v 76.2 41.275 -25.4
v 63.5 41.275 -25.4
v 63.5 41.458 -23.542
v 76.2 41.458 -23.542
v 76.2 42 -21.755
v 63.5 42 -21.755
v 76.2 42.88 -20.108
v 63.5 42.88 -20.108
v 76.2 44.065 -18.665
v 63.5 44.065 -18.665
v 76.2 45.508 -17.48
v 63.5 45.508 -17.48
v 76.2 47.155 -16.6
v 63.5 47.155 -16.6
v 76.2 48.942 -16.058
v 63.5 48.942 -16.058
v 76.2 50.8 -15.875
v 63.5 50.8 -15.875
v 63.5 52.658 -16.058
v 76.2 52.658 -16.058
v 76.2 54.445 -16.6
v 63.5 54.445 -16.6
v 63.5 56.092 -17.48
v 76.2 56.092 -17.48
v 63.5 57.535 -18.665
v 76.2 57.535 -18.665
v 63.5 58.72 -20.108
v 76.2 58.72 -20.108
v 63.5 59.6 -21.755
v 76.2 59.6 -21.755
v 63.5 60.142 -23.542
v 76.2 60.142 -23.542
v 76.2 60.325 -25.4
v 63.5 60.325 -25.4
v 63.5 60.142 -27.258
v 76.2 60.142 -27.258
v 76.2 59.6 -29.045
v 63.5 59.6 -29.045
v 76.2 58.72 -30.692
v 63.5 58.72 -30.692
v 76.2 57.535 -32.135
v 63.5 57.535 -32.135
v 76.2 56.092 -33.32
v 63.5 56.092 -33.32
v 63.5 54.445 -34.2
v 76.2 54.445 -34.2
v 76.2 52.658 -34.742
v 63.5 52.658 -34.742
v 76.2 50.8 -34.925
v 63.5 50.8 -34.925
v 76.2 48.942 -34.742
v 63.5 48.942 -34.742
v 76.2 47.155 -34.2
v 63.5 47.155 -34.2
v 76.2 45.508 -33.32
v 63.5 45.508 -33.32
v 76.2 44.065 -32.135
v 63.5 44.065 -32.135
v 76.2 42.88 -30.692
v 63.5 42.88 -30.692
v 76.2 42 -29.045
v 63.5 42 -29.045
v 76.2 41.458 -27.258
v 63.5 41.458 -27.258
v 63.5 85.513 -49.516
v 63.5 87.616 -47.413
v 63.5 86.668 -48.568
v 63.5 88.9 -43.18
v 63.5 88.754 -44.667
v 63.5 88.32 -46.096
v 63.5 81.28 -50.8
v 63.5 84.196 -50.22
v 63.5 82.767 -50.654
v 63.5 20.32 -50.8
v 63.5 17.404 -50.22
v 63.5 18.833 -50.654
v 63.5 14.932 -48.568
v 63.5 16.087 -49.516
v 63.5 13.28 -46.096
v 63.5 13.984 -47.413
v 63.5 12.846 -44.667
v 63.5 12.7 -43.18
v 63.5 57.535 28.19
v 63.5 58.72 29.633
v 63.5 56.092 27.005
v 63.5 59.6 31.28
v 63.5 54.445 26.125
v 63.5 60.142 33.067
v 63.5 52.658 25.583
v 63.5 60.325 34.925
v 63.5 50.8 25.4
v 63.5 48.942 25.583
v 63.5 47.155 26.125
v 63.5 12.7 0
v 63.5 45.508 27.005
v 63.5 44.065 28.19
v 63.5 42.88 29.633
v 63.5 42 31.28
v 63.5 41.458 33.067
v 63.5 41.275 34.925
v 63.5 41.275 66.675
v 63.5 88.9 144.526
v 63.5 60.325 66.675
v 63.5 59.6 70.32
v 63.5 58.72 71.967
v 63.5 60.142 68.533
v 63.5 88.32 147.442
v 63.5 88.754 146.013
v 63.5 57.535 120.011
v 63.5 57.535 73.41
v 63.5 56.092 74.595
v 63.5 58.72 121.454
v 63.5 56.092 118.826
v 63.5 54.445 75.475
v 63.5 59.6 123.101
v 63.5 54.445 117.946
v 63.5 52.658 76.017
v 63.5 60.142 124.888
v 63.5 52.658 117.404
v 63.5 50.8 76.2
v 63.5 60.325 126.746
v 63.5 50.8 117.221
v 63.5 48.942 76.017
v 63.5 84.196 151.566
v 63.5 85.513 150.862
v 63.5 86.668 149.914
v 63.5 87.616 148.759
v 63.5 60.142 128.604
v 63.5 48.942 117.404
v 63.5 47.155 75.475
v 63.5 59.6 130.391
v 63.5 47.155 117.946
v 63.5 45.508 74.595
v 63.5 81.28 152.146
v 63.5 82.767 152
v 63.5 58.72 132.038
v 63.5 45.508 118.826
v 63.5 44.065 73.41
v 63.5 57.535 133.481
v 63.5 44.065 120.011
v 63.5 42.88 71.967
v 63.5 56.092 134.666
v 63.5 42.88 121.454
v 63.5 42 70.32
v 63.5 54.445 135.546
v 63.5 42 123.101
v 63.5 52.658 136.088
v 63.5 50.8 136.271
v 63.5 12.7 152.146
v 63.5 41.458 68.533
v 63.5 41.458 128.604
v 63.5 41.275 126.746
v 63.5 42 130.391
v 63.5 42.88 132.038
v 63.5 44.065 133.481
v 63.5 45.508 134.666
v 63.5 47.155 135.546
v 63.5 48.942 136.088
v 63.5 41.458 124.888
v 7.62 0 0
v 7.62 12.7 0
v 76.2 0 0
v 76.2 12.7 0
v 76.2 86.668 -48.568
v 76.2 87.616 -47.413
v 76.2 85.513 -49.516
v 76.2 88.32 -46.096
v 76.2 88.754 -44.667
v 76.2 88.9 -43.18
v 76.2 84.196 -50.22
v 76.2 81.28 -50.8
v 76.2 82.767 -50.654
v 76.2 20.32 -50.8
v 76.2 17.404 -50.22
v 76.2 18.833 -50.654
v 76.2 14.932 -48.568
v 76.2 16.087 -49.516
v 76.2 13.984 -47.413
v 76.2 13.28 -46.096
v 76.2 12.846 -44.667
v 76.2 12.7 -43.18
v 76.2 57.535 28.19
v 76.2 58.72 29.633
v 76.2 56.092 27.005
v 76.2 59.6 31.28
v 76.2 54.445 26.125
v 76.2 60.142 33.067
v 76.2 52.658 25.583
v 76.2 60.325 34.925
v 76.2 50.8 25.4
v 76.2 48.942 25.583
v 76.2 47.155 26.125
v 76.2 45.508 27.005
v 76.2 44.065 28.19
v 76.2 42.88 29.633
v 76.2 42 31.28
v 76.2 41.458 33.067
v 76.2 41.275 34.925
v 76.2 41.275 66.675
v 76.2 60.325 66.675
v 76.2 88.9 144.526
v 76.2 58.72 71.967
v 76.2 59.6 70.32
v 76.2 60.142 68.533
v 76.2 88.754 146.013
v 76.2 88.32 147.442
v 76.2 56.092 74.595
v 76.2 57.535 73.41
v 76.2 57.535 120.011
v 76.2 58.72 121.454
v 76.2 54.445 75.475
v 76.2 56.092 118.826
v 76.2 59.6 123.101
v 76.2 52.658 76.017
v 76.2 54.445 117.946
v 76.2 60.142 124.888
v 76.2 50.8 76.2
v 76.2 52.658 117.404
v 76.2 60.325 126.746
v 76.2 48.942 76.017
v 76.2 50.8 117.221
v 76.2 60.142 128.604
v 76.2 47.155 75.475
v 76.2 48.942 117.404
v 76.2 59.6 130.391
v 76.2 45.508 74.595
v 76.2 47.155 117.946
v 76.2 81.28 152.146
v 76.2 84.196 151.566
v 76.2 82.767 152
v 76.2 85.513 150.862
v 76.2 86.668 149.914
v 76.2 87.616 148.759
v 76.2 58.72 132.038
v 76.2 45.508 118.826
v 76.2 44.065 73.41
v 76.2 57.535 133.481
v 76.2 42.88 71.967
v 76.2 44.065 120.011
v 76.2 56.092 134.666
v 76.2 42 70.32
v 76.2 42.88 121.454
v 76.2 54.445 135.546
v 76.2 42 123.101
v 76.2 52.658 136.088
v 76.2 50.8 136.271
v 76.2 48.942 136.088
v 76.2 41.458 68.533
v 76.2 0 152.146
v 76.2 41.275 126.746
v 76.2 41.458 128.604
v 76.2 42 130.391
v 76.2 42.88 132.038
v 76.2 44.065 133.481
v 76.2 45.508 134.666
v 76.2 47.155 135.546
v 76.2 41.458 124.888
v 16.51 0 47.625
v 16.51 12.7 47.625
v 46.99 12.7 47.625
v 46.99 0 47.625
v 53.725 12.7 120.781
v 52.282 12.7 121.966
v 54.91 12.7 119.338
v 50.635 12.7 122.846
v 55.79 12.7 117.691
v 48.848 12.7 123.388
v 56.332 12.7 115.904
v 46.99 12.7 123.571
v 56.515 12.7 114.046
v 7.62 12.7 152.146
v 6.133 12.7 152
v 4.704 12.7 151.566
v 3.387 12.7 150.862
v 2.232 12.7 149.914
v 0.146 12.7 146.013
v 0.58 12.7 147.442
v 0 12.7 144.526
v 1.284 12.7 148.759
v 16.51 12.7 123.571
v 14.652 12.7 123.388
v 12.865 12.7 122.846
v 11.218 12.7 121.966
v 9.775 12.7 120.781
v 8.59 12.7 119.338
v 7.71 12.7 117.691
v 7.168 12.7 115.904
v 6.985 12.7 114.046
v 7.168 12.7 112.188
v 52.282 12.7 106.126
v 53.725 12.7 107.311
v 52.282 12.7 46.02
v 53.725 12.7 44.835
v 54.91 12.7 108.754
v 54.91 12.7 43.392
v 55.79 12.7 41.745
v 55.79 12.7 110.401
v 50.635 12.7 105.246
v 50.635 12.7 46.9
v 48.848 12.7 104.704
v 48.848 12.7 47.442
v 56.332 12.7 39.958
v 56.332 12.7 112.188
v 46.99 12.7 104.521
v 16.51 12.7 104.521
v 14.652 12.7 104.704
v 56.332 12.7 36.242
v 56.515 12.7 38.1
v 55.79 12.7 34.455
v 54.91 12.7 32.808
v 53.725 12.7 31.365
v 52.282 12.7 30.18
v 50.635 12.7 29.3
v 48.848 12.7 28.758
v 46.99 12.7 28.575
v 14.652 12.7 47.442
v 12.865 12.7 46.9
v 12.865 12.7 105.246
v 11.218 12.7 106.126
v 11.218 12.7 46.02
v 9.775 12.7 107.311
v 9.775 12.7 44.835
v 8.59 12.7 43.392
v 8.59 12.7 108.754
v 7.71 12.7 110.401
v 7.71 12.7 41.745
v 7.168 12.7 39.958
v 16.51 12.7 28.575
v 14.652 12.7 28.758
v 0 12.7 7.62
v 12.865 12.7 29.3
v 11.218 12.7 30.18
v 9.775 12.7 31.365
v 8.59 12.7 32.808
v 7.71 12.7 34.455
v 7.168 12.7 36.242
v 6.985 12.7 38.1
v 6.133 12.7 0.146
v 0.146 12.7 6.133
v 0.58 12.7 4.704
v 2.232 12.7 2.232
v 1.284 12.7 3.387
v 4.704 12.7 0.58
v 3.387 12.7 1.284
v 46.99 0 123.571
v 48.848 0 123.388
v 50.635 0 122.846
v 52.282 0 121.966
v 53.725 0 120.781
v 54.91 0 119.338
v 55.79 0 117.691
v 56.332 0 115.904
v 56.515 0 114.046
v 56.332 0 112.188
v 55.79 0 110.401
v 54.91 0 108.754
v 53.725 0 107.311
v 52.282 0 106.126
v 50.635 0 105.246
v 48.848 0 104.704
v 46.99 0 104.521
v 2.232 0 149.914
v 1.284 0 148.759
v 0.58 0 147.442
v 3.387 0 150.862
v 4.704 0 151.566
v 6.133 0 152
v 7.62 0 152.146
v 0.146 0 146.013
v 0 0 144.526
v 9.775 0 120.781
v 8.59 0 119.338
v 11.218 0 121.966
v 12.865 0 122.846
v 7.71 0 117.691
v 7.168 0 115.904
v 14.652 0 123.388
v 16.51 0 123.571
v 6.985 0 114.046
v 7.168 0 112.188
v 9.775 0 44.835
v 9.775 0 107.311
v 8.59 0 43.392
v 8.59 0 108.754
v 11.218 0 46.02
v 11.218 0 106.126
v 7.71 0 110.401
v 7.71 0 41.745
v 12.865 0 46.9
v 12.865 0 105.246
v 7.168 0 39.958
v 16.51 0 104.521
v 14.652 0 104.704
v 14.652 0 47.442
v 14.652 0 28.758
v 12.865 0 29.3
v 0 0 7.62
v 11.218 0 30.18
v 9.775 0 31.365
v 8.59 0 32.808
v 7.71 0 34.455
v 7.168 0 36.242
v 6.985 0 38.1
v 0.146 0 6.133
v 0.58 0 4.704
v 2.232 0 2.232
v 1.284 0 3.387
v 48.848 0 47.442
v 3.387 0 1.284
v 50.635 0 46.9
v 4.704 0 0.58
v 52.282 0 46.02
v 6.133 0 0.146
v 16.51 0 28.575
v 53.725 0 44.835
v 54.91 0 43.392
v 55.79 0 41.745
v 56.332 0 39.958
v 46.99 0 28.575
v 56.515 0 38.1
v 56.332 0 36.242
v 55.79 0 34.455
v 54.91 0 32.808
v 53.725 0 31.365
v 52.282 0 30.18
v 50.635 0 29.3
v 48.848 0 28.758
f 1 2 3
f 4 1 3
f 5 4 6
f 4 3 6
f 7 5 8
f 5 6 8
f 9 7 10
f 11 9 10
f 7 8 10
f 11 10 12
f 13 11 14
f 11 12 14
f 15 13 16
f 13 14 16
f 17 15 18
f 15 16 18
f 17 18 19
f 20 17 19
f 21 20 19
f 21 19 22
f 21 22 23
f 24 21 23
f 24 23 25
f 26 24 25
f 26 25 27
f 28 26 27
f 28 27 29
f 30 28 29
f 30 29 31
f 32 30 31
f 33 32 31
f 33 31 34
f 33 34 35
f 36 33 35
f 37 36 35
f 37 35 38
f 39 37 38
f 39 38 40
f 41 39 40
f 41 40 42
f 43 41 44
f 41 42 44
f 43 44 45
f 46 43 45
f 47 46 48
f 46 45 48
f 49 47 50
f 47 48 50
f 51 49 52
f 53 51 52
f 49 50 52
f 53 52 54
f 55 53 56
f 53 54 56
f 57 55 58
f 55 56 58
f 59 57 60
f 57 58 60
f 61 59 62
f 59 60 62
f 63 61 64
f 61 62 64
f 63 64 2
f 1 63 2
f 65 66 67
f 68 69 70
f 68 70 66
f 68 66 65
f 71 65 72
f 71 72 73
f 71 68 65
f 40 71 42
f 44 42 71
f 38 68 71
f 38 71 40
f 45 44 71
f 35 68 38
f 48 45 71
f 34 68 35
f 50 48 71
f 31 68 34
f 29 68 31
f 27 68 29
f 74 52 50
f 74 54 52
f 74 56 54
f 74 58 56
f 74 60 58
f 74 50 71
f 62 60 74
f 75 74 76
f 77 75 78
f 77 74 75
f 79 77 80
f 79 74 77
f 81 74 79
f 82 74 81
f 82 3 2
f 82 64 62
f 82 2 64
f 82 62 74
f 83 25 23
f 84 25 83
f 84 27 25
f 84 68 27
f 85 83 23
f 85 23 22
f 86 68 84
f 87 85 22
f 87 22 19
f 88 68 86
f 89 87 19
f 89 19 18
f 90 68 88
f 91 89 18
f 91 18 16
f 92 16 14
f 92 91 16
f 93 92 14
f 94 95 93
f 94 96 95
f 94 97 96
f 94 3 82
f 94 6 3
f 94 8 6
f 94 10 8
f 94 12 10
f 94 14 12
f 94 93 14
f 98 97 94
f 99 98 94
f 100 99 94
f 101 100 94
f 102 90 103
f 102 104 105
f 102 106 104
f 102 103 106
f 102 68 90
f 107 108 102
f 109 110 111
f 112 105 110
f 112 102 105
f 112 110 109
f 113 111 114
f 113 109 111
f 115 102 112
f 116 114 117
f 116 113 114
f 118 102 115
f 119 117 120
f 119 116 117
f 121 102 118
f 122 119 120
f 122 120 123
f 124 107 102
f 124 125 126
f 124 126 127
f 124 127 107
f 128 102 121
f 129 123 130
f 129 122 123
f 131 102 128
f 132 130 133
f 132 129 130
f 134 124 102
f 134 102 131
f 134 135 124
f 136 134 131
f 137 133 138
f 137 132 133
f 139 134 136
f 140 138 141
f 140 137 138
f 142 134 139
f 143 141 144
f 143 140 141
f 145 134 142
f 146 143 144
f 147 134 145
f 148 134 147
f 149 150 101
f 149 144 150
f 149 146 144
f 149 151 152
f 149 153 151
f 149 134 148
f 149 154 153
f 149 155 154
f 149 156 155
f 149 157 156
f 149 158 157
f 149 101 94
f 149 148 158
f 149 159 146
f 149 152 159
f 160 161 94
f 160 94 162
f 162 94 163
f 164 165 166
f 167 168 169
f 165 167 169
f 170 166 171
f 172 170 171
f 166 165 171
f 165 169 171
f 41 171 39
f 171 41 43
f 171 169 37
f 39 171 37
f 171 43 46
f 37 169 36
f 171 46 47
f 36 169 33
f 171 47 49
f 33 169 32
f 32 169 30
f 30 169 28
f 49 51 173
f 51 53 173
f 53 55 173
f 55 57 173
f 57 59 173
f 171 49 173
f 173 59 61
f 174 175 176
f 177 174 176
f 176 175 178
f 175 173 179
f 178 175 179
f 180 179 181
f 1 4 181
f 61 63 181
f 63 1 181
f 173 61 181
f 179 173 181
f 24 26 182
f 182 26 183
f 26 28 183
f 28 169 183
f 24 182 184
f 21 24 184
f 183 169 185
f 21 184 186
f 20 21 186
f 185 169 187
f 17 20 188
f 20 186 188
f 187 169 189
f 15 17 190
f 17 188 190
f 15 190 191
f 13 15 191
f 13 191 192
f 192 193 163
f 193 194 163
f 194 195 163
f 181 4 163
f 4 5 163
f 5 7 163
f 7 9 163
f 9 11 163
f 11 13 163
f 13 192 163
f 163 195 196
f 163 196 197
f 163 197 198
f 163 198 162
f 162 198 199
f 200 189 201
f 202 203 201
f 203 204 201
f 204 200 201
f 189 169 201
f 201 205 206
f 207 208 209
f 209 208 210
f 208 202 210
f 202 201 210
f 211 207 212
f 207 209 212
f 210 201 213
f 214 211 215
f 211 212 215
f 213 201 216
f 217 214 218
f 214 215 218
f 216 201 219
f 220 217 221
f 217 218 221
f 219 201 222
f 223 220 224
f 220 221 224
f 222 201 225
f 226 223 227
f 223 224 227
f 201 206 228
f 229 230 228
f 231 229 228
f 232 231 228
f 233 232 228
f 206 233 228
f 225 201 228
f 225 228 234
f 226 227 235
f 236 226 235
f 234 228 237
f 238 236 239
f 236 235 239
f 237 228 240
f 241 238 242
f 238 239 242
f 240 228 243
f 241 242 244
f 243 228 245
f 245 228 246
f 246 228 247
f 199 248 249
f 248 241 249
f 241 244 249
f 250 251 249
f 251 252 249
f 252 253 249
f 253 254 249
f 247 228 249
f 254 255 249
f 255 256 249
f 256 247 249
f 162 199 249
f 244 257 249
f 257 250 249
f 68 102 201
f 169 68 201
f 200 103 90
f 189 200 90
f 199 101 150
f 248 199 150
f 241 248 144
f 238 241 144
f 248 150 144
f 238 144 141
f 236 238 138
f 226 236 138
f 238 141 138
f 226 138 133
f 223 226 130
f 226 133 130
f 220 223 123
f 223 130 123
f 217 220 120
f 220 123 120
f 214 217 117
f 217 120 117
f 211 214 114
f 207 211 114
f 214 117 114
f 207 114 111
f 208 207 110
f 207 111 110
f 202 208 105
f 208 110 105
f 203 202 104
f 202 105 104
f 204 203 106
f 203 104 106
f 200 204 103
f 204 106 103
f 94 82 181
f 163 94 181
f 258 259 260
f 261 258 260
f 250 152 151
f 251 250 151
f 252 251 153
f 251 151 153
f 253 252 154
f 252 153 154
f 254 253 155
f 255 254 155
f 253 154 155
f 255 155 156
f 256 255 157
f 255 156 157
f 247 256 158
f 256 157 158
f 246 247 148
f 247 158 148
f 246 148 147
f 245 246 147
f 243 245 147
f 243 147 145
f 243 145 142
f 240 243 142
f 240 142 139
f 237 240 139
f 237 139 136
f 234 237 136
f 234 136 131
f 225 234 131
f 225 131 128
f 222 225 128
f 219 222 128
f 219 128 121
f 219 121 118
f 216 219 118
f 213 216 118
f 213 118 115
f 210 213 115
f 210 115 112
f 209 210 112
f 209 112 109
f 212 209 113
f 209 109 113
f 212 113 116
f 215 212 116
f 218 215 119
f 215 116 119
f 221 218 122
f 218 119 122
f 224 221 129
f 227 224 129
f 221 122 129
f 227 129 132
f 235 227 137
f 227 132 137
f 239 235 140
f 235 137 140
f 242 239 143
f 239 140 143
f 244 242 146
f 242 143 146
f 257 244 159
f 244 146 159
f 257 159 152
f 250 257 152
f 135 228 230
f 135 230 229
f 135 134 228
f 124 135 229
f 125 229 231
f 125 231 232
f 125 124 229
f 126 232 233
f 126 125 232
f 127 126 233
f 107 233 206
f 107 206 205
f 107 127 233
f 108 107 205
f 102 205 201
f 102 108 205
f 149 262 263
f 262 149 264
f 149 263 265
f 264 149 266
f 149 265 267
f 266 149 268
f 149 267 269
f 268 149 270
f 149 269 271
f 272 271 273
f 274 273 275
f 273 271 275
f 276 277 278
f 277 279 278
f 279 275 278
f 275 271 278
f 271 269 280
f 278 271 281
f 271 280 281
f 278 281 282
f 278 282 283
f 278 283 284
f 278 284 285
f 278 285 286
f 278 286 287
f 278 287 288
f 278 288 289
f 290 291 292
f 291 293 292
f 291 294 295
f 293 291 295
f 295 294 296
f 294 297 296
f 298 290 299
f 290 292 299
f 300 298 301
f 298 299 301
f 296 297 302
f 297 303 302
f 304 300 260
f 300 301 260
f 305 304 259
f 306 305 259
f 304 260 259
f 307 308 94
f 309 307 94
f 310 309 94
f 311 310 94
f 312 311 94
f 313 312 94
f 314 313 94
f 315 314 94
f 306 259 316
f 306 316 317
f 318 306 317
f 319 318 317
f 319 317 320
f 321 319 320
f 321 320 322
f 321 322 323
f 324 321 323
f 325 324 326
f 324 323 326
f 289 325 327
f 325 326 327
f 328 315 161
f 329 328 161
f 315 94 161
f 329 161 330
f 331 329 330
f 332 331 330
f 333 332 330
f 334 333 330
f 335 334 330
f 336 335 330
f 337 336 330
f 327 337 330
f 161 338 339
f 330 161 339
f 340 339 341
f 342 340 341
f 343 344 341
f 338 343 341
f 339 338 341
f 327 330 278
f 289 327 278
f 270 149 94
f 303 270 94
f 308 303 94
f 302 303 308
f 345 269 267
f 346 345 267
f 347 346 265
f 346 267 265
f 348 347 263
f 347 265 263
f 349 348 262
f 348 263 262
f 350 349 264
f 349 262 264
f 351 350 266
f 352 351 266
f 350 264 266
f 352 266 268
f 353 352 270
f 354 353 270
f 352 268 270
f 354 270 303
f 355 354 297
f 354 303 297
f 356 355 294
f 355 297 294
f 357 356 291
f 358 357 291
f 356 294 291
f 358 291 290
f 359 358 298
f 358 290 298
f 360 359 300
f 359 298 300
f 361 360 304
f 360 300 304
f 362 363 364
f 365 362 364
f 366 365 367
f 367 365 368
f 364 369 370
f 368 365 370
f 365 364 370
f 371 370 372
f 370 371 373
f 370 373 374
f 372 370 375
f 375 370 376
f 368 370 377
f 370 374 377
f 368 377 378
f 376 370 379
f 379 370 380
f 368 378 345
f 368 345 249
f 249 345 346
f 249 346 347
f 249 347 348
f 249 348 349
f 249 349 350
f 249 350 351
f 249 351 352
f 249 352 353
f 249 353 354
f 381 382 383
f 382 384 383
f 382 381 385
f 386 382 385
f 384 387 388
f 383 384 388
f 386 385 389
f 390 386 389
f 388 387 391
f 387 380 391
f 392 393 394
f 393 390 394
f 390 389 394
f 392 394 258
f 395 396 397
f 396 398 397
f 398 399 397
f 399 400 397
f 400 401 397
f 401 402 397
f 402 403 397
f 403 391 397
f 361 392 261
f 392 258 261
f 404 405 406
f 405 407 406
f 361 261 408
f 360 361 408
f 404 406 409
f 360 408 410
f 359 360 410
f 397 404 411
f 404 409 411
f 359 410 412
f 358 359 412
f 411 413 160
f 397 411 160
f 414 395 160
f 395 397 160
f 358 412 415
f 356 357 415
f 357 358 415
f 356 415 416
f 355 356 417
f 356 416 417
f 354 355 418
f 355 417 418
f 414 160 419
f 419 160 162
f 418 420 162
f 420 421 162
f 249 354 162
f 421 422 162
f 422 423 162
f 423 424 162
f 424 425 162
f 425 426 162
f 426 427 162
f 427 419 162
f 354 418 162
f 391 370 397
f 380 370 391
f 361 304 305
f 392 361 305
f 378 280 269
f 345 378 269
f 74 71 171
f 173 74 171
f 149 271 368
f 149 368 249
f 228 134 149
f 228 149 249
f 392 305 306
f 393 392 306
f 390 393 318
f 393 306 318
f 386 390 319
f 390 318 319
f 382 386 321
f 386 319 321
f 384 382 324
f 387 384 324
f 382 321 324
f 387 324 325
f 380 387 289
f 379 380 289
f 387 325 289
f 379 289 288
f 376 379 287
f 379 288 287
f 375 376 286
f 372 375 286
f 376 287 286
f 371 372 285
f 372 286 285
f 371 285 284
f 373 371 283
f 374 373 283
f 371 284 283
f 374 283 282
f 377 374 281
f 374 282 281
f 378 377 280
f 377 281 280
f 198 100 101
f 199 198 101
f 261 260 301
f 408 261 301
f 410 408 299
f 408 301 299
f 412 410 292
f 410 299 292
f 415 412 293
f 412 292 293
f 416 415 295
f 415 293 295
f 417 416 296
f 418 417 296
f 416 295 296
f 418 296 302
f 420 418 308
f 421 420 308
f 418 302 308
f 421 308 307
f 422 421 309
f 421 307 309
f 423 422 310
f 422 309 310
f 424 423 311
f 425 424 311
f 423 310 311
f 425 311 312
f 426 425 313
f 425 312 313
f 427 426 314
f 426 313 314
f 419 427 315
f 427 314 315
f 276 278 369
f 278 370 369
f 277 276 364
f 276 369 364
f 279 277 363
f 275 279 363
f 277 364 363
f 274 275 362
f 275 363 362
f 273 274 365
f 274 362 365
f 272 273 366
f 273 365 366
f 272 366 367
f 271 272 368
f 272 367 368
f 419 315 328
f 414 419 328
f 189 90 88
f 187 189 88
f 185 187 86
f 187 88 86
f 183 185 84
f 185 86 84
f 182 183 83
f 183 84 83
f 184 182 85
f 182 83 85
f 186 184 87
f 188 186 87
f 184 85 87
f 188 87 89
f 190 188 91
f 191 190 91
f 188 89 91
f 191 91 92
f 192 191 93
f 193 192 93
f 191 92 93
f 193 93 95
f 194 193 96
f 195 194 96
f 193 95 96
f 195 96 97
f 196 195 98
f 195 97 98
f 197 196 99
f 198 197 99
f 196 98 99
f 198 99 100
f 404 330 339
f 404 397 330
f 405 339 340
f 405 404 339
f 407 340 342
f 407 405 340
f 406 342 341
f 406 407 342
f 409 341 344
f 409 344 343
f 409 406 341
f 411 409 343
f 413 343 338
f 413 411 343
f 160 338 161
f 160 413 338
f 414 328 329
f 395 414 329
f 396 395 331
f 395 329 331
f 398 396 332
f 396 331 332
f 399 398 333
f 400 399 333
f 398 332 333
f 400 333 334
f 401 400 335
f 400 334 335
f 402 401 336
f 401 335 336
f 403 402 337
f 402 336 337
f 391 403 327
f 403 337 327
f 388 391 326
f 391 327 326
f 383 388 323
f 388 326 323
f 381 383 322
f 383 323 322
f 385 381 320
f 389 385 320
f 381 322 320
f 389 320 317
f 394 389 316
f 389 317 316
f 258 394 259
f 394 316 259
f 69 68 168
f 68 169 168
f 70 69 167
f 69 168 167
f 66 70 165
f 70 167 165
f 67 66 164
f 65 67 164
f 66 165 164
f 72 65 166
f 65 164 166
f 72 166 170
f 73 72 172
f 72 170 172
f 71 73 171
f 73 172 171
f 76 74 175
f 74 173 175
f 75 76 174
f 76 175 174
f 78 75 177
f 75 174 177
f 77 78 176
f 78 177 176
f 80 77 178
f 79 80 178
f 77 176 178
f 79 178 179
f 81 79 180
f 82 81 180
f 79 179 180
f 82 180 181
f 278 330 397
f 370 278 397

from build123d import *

# Parameters (mm, degrees)
F1_DEPTH  = 152.146
F2_W      = 12.7
F2_H      = 76.2
F3_DEPTH  = 50.8
F4_R      = 7.62
F5_R      = 7.62
F6_R      = 7.62
F8_DEPTH  = 25.4
F9_R      = 9.525
F10_DEPTH = 12.701


with BuildPart() as f1:
    # F0 (on Top) → F1 (new body)
    with BuildSketch(Plane.XY):
        Polygon((0, 12.7), (0, 0), (76.2, 0), (76.2, 88.9), (63.5, 88.9), (63.5, 12.7), align=None)
    extrude(amount=F1_DEPTH)

    # F2 (on face) → F3 (join)
    with BuildSketch(Plane(origin=(0, 0, 0), x_dir=(1, 0, 0), z_dir=(0, 0, -1))):
        with Locations((69.85, -50.8)):
            Rectangle(F2_W, F2_H)
    extrude(amount=F3_DEPTH)

    # F4
    f4_edges = [f1.edges().sort_by_distance(p)[0] for p in [
        (0, 6.35, 0),
        (0, 6.35, 152.146),
    ]]
    fillet(f4_edges, radius=F4_R)

    # F5
    f5_edges = [f1.edges().sort_by_distance(p)[0] for p in [
        (69.85, 88.9, 152.146),
    ]]
    fillet(f5_edges, radius=F5_R)

    # F6
    f6_edges = [f1.edges().sort_by_distance(p)[0] for p in [
        (69.85, 12.7, -50.8),
        (69.85, 88.9, -50.8),
    ]]
    fillet(f6_edges, radius=F6_R)

    # F7 (on face) → F8 (cut)
    with BuildSketch(Plane(origin=(0, 12.7, 0), x_dir=(-1, 0, 0), z_dir=(0, 1, 0))):
        with BuildLine():
            Line((-46.99, 28.575), (-16.51, 28.575))
            ThreePointArc((-16.51, 28.575), (-6.985, 38.1), (-16.51, 47.625))
            Line((-16.51, 47.625), (-46.99, 47.625))
            ThreePointArc((-46.99, 47.625), (-56.515, 38.1), (-46.99, 28.575))
        make_face()
        with BuildLine():
            Line((-46.99, 104.521), (-16.51, 104.521))
            ThreePointArc((-16.51, 104.521), (-6.985, 114.046), (-16.51, 123.571))
            Line((-16.51, 123.571), (-46.99, 123.571))
            ThreePointArc((-46.99, 123.571), (-56.515, 114.046), (-46.99, 104.521))
        make_face()
    extrude(amount=-F8_DEPTH, mode=Mode.SUBTRACT)

    # F9 (on face) → F10 (cut, through all)
    with BuildSketch(Plane(origin=(63.5, 0, 0), x_dir=(0, -1, 0), z_dir=(-1, 0, 0))):
        with Locations((-50.8, -25.4)):
            Circle(F9_R)
        with BuildLine():
            Line((-41.275, 34.925002), (-41.275, 66.675002))
            ThreePointArc((-41.275, 66.675002), (-50.800002, 76.199998), (-60.325, 66.674998))
            Line((-60.325, 66.674998), (-60.325, 34.924998))
            ThreePointArc((-60.325, 34.924998), (-50.799998, 25.399998), (-41.275, 34.925002))
        make_face()
        with Locations((-50.8, 126.746)):
            Circle(F9_R)
    extrude(amount=-F10_DEPTH, mode=Mode.SUBTRACT)


solid = f1.part
